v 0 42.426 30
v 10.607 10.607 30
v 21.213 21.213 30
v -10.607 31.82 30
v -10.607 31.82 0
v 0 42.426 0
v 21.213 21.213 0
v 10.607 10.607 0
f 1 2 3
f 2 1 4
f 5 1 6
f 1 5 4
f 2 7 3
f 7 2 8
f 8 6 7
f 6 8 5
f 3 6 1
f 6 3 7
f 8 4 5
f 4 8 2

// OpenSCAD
rotate([0,-90,0]){
    difference(){
        rotate([-45,0,0]) {
            cube([30, 30, 30]);
        }
        rotate([-45,0,0]) {
            cube([30, 15, 30]);
        }
    }
}
